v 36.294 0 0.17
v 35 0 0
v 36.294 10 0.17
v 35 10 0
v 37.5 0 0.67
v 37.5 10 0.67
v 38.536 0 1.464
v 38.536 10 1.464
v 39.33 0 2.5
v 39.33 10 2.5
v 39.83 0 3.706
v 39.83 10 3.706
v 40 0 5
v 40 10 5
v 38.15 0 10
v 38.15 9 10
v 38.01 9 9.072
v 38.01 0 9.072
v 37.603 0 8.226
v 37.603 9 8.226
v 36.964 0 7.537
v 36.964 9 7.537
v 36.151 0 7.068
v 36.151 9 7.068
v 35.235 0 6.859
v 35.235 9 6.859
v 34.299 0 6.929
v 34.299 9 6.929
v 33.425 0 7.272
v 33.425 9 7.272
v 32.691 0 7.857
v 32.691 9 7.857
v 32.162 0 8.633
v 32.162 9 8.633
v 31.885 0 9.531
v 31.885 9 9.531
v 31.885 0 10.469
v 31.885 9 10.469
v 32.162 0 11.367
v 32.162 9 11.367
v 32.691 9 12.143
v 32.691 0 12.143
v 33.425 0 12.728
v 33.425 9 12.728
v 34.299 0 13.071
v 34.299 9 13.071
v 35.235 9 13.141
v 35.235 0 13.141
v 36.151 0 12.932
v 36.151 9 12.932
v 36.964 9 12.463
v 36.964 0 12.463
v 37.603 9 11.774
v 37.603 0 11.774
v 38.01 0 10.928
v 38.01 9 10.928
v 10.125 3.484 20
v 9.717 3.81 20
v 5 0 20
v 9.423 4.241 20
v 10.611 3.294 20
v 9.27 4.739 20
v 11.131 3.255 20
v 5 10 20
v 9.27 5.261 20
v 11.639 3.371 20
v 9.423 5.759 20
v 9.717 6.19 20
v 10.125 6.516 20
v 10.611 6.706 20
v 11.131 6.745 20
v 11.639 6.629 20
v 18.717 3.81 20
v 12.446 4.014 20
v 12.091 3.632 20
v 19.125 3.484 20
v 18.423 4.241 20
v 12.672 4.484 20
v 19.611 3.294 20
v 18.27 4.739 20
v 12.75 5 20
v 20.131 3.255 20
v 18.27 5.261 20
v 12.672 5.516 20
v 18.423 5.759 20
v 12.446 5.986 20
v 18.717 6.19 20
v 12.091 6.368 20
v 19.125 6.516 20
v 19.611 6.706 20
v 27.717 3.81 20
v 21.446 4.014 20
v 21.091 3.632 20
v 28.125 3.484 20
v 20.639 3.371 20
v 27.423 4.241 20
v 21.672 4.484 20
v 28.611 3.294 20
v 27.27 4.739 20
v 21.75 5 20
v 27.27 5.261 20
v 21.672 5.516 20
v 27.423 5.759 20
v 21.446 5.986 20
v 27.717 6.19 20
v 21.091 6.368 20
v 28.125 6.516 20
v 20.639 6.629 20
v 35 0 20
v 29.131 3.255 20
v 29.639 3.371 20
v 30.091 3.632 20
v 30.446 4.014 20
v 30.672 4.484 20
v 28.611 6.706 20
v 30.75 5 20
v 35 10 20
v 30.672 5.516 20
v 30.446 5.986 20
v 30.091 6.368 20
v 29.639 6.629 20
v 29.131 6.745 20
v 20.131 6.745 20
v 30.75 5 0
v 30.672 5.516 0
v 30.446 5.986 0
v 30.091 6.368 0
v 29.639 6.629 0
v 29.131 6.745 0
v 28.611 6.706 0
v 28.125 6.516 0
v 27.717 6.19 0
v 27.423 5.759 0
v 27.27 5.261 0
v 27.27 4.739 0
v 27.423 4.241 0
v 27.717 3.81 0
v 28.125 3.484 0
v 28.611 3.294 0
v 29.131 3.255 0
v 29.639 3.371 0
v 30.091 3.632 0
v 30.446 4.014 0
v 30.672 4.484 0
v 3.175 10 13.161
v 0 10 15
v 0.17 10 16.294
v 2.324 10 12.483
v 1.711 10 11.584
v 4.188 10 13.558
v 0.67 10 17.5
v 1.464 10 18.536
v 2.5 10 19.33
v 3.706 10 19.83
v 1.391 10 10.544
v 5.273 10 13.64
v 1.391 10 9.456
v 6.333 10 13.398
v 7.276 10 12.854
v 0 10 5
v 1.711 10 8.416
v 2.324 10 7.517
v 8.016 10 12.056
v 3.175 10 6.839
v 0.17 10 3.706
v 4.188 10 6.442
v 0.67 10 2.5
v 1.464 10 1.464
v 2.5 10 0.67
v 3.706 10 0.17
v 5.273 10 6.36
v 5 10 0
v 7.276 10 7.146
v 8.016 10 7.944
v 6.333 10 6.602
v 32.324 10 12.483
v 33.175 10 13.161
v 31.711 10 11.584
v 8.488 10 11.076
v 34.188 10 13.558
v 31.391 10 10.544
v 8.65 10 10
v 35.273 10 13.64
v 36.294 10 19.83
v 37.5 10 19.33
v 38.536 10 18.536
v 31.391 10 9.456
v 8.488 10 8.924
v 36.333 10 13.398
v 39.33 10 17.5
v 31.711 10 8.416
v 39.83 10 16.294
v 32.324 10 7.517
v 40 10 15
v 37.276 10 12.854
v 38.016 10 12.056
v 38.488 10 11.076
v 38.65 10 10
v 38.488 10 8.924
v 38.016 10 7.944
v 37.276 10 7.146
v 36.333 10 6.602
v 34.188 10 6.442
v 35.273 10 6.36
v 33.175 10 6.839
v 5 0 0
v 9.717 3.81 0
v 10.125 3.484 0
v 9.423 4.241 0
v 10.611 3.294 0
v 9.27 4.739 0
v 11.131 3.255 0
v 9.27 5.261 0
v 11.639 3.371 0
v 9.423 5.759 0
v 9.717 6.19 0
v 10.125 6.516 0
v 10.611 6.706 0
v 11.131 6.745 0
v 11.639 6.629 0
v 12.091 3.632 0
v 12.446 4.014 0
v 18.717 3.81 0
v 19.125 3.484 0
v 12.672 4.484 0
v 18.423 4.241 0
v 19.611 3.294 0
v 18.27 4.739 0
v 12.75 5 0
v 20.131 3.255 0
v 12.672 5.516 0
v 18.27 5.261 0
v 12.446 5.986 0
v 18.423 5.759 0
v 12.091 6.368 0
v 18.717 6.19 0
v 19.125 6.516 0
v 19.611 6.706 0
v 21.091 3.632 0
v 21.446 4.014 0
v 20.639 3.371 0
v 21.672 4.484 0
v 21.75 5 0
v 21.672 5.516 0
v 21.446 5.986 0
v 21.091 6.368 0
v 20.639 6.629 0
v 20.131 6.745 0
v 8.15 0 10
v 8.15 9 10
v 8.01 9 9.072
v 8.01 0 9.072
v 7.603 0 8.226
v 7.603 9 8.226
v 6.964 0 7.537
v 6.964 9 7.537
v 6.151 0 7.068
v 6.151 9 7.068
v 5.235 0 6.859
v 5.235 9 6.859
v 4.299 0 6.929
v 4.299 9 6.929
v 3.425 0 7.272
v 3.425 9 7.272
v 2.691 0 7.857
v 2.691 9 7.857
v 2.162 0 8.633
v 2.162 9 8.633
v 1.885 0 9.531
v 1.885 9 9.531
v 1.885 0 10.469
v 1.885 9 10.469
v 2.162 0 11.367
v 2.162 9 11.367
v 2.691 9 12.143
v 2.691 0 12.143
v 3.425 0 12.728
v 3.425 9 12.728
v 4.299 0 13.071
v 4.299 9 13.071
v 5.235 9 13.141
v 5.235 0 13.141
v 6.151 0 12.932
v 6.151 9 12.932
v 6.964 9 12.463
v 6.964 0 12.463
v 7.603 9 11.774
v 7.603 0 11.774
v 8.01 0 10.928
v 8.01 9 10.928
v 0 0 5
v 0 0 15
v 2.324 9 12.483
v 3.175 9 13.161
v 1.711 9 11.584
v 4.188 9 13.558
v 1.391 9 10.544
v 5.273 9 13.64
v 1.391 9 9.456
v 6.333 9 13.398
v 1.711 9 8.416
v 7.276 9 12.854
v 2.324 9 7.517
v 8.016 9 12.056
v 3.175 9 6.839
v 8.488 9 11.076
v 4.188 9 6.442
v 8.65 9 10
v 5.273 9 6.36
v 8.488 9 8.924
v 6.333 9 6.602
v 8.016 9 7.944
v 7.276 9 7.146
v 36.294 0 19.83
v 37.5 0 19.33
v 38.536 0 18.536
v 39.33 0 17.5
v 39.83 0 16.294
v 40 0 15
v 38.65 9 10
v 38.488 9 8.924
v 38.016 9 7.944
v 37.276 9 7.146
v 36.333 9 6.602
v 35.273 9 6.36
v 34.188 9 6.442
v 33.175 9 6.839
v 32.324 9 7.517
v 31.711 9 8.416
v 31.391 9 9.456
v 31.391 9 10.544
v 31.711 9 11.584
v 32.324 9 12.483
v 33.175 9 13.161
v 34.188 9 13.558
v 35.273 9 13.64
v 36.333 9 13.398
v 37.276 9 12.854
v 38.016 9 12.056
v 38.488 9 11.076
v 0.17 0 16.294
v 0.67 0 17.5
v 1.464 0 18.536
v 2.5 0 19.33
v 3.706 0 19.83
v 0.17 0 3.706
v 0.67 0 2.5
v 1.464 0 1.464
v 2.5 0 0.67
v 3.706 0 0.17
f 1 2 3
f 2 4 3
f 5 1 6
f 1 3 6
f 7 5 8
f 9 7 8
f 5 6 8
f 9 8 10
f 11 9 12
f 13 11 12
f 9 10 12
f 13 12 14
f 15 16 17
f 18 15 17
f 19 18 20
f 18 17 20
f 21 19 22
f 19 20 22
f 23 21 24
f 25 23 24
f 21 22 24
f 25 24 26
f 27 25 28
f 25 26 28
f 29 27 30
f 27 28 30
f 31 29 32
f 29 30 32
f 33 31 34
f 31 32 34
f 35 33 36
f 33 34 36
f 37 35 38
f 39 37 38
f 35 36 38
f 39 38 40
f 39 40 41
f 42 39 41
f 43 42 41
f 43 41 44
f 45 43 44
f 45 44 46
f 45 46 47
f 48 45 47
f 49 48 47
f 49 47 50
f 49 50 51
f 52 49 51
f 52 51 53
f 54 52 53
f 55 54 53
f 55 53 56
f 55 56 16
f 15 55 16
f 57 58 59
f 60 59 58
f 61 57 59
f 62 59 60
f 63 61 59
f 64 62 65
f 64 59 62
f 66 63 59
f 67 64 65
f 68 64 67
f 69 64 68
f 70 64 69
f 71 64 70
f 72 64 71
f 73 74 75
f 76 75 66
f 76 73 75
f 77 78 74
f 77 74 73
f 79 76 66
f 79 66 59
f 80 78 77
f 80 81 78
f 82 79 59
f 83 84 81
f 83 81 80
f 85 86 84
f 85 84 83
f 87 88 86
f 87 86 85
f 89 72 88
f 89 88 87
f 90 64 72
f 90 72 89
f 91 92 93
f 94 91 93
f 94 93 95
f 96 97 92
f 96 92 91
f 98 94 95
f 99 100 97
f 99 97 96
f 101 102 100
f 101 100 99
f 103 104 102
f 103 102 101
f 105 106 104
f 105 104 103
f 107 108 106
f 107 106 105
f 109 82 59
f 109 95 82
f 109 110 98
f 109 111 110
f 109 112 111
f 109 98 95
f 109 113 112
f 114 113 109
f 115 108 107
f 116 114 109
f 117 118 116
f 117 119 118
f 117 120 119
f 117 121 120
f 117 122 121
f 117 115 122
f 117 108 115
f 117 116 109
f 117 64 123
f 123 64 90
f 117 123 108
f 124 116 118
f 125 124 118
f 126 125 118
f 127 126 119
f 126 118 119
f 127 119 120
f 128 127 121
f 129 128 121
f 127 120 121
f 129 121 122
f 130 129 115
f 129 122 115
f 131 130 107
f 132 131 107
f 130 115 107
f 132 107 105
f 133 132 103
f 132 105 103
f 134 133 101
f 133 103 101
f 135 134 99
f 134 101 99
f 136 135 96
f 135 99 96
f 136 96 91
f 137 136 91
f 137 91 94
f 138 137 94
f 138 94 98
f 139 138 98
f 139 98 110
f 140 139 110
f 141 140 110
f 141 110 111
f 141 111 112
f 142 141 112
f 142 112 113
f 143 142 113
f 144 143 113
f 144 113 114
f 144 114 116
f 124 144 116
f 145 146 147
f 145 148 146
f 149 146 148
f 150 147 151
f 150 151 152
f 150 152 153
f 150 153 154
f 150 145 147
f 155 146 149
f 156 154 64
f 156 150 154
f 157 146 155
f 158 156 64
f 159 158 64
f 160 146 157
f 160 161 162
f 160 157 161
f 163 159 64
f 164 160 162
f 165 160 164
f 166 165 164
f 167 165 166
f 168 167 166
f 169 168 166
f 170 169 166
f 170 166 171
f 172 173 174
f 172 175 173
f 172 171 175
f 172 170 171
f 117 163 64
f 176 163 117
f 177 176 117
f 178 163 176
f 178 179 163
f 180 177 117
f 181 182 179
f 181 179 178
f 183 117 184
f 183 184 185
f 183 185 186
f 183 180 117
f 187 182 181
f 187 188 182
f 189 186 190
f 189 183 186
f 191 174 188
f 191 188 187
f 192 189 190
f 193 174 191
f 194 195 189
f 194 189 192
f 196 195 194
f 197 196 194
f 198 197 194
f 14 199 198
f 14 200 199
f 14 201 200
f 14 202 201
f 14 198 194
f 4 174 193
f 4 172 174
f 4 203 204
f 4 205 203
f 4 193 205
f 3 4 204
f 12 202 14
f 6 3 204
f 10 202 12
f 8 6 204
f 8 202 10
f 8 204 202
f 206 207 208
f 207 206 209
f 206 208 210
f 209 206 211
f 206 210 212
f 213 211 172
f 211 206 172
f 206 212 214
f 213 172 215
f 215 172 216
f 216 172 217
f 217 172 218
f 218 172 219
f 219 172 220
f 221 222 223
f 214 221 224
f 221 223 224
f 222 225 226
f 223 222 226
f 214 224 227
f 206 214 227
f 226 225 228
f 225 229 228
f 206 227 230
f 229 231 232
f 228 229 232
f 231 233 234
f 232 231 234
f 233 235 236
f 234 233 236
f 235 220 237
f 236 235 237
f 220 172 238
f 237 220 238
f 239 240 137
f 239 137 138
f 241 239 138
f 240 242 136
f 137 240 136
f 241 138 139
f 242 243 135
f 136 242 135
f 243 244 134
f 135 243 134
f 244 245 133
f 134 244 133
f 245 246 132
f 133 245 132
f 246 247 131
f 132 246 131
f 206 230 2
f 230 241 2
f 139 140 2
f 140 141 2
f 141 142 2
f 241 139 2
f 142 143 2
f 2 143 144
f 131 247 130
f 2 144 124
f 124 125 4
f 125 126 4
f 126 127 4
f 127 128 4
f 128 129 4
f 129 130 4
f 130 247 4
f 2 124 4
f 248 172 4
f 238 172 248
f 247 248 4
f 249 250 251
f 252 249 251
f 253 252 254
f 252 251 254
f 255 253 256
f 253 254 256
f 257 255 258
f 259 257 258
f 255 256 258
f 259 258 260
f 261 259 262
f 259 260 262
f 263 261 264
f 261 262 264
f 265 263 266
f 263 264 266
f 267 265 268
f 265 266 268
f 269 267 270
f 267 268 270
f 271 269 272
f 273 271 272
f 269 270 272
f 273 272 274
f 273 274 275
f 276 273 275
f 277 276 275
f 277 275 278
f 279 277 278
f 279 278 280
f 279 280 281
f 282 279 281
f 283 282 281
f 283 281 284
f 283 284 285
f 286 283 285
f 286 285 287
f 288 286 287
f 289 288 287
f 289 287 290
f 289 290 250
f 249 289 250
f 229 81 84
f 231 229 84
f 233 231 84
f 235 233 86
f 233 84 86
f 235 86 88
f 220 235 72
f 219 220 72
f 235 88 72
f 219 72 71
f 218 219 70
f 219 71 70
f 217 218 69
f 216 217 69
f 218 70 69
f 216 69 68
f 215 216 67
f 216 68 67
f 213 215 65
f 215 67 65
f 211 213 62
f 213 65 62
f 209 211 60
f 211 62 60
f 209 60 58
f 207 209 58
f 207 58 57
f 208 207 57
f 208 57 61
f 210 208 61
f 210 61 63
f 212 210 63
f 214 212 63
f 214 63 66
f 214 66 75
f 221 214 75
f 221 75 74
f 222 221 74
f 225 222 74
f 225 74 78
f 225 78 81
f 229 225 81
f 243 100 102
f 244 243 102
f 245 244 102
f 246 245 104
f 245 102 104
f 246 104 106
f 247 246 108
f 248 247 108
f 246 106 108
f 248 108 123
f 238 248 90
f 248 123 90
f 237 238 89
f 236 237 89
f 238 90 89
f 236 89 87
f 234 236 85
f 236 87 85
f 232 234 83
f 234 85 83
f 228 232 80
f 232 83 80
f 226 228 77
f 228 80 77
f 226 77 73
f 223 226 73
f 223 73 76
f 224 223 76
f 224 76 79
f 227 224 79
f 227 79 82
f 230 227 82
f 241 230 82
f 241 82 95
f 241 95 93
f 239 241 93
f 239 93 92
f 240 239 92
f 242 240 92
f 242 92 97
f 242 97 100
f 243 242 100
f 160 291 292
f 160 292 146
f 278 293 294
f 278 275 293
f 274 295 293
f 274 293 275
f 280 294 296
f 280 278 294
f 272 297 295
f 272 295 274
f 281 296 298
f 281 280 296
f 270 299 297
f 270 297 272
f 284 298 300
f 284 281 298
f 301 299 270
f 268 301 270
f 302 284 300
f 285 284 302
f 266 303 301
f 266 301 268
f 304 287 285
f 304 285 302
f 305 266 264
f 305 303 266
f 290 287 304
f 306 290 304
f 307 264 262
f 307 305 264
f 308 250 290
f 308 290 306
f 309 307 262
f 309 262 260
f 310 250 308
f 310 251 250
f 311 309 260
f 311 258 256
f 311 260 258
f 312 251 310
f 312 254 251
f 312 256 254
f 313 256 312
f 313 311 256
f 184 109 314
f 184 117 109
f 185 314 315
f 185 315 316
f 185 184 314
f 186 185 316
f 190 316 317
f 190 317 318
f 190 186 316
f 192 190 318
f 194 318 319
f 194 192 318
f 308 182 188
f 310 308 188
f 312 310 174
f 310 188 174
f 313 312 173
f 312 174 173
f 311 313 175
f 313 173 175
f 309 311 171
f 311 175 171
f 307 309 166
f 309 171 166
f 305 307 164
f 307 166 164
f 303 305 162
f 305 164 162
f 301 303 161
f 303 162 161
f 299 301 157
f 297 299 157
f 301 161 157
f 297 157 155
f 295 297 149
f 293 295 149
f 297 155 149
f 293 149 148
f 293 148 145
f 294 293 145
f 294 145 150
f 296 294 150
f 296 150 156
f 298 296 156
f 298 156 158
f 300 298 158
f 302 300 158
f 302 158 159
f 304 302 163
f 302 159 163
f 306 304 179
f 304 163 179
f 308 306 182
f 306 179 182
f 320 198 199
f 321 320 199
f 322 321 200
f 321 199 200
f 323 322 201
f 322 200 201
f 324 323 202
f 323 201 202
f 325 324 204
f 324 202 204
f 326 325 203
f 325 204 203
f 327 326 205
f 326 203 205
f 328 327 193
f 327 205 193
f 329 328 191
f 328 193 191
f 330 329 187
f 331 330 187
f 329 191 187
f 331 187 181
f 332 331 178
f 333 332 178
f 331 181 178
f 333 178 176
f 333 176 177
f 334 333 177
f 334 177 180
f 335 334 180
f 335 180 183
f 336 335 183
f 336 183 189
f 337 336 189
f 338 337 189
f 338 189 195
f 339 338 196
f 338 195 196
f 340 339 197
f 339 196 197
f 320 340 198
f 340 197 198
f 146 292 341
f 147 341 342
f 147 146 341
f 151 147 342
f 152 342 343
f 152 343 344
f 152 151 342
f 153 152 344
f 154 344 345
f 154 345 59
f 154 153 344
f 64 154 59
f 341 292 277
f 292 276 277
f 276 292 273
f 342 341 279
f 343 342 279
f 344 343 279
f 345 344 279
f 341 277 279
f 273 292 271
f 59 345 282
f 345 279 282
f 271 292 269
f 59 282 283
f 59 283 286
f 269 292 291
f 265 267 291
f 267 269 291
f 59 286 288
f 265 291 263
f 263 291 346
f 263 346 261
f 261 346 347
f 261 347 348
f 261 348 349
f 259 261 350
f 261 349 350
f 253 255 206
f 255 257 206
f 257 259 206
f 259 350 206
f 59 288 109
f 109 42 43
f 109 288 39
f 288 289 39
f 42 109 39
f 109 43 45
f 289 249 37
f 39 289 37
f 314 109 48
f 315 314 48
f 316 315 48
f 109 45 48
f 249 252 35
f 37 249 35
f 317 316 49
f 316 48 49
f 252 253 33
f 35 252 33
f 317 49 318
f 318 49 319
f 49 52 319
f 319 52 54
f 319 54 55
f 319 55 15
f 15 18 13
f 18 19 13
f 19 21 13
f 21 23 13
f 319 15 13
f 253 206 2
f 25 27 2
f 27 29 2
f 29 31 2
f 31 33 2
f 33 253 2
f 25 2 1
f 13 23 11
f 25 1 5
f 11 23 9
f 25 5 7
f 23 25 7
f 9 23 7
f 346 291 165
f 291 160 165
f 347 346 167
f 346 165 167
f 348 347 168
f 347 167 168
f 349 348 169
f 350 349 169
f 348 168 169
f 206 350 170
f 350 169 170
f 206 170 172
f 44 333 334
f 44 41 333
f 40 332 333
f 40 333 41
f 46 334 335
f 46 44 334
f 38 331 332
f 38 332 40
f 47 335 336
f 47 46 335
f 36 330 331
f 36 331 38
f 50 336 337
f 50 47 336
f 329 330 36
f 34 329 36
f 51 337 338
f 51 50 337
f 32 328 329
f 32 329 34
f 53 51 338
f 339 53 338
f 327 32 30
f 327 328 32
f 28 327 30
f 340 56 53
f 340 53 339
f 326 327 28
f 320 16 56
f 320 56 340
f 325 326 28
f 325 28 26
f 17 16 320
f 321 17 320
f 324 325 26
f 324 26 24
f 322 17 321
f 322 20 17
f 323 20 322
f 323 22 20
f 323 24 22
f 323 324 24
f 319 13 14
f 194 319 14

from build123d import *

# Parameters (mm, degrees)
ESQUISSE1_W                  = 40
ESQUISSE1_H                  = 10
BOSS_EXTRU_1_DEPTH           = 20
ESQUISSE2_R                  = 1.75
ENL_V_MAT_EXTRU_1_DEPTH      = 1
ENL_V_MAT_EXTRU_1_DEPTH_BACK = 21
ESQUISSE3_R                  = 3.15
ENL_V_MAT_EXTRU_2_DEPTH      = 1
ENL_V_MAT_EXTRU_2_DEPTH_BACK = 11
ESQUISSE4_R                  = 3.65
ENL_V_MAT_EXTRU_3_DEPTH      = 1
CONG_1_R                     = 5


with BuildPart() as part:
    # Esquisse1 → Boss.-Extru.1 (new body)
    with BuildSketch(Plane.XY):
        with Locations((20, 5)):
            Rectangle(ESQUISSE1_W, ESQUISSE1_H)
    extrude(amount=BOSS_EXTRU_1_DEPTH)

    # Esquisse2 → Enlèv. mat.-Extru.1 (cut, two sides)
    with BuildSketch(Plane.XY.offset(20)) as enl_v_mat_extru_1_sk:
        with Locations((20, 5)):
            Circle(ESQUISSE2_R)
        with Locations((11, 5)):
            Circle(ESQUISSE2_R)
        with Locations((29, 5)):
            Circle(ESQUISSE2_R)
    extrude(amount=ENL_V_MAT_EXTRU_1_DEPTH, mode=Mode.SUBTRACT)
    extrude(enl_v_mat_extru_1_sk.sketch, amount=-ENL_V_MAT_EXTRU_1_DEPTH_BACK, mode=Mode.SUBTRACT)

    # Esquisse3 → Enlèv. mat.-Extru.2 (cut, two sides)
    with BuildSketch(Plane(origin=(0, 10, 0), x_dir=(1, 0, 0), z_dir=(0, 1, 0))) as enl_v_mat_extru_2_sk:
        with Locations((5, -10)):
            Circle(ESQUISSE3_R)
        with Locations((35, -10)):
            Circle(ESQUISSE3_R)
    extrude(amount=ENL_V_MAT_EXTRU_2_DEPTH, mode=Mode.SUBTRACT)
    extrude(enl_v_mat_extru_2_sk.sketch, amount=-ENL_V_MAT_EXTRU_2_DEPTH_BACK, mode=Mode.SUBTRACT)

    # Esquisse4 → Enlèv. mat.-Extru.3 (cut)
    with BuildSketch(Plane(origin=(0, 10, 0), x_dir=(1, 0, 0), z_dir=(0, 1, 0))):
        with Locations((5, -10)):
            Circle(ESQUISSE4_R)
        with Locations((35, -10)):
            Circle(ESQUISSE4_R)
    extrude(amount=-ENL_V_MAT_EXTRU_3_DEPTH, mode=Mode.SUBTRACT)

    # Congé1
    cong_1_edges = [part.edges().sort_by_distance(p)[0] for p in [
        (40, 5, 20),
        (0, 5, 20),
        (40, 5, 0),
        (0, 5, 0),
    ]]
    fillet(cong_1_edges, radius=CONG_1_R)


solid = part.part
